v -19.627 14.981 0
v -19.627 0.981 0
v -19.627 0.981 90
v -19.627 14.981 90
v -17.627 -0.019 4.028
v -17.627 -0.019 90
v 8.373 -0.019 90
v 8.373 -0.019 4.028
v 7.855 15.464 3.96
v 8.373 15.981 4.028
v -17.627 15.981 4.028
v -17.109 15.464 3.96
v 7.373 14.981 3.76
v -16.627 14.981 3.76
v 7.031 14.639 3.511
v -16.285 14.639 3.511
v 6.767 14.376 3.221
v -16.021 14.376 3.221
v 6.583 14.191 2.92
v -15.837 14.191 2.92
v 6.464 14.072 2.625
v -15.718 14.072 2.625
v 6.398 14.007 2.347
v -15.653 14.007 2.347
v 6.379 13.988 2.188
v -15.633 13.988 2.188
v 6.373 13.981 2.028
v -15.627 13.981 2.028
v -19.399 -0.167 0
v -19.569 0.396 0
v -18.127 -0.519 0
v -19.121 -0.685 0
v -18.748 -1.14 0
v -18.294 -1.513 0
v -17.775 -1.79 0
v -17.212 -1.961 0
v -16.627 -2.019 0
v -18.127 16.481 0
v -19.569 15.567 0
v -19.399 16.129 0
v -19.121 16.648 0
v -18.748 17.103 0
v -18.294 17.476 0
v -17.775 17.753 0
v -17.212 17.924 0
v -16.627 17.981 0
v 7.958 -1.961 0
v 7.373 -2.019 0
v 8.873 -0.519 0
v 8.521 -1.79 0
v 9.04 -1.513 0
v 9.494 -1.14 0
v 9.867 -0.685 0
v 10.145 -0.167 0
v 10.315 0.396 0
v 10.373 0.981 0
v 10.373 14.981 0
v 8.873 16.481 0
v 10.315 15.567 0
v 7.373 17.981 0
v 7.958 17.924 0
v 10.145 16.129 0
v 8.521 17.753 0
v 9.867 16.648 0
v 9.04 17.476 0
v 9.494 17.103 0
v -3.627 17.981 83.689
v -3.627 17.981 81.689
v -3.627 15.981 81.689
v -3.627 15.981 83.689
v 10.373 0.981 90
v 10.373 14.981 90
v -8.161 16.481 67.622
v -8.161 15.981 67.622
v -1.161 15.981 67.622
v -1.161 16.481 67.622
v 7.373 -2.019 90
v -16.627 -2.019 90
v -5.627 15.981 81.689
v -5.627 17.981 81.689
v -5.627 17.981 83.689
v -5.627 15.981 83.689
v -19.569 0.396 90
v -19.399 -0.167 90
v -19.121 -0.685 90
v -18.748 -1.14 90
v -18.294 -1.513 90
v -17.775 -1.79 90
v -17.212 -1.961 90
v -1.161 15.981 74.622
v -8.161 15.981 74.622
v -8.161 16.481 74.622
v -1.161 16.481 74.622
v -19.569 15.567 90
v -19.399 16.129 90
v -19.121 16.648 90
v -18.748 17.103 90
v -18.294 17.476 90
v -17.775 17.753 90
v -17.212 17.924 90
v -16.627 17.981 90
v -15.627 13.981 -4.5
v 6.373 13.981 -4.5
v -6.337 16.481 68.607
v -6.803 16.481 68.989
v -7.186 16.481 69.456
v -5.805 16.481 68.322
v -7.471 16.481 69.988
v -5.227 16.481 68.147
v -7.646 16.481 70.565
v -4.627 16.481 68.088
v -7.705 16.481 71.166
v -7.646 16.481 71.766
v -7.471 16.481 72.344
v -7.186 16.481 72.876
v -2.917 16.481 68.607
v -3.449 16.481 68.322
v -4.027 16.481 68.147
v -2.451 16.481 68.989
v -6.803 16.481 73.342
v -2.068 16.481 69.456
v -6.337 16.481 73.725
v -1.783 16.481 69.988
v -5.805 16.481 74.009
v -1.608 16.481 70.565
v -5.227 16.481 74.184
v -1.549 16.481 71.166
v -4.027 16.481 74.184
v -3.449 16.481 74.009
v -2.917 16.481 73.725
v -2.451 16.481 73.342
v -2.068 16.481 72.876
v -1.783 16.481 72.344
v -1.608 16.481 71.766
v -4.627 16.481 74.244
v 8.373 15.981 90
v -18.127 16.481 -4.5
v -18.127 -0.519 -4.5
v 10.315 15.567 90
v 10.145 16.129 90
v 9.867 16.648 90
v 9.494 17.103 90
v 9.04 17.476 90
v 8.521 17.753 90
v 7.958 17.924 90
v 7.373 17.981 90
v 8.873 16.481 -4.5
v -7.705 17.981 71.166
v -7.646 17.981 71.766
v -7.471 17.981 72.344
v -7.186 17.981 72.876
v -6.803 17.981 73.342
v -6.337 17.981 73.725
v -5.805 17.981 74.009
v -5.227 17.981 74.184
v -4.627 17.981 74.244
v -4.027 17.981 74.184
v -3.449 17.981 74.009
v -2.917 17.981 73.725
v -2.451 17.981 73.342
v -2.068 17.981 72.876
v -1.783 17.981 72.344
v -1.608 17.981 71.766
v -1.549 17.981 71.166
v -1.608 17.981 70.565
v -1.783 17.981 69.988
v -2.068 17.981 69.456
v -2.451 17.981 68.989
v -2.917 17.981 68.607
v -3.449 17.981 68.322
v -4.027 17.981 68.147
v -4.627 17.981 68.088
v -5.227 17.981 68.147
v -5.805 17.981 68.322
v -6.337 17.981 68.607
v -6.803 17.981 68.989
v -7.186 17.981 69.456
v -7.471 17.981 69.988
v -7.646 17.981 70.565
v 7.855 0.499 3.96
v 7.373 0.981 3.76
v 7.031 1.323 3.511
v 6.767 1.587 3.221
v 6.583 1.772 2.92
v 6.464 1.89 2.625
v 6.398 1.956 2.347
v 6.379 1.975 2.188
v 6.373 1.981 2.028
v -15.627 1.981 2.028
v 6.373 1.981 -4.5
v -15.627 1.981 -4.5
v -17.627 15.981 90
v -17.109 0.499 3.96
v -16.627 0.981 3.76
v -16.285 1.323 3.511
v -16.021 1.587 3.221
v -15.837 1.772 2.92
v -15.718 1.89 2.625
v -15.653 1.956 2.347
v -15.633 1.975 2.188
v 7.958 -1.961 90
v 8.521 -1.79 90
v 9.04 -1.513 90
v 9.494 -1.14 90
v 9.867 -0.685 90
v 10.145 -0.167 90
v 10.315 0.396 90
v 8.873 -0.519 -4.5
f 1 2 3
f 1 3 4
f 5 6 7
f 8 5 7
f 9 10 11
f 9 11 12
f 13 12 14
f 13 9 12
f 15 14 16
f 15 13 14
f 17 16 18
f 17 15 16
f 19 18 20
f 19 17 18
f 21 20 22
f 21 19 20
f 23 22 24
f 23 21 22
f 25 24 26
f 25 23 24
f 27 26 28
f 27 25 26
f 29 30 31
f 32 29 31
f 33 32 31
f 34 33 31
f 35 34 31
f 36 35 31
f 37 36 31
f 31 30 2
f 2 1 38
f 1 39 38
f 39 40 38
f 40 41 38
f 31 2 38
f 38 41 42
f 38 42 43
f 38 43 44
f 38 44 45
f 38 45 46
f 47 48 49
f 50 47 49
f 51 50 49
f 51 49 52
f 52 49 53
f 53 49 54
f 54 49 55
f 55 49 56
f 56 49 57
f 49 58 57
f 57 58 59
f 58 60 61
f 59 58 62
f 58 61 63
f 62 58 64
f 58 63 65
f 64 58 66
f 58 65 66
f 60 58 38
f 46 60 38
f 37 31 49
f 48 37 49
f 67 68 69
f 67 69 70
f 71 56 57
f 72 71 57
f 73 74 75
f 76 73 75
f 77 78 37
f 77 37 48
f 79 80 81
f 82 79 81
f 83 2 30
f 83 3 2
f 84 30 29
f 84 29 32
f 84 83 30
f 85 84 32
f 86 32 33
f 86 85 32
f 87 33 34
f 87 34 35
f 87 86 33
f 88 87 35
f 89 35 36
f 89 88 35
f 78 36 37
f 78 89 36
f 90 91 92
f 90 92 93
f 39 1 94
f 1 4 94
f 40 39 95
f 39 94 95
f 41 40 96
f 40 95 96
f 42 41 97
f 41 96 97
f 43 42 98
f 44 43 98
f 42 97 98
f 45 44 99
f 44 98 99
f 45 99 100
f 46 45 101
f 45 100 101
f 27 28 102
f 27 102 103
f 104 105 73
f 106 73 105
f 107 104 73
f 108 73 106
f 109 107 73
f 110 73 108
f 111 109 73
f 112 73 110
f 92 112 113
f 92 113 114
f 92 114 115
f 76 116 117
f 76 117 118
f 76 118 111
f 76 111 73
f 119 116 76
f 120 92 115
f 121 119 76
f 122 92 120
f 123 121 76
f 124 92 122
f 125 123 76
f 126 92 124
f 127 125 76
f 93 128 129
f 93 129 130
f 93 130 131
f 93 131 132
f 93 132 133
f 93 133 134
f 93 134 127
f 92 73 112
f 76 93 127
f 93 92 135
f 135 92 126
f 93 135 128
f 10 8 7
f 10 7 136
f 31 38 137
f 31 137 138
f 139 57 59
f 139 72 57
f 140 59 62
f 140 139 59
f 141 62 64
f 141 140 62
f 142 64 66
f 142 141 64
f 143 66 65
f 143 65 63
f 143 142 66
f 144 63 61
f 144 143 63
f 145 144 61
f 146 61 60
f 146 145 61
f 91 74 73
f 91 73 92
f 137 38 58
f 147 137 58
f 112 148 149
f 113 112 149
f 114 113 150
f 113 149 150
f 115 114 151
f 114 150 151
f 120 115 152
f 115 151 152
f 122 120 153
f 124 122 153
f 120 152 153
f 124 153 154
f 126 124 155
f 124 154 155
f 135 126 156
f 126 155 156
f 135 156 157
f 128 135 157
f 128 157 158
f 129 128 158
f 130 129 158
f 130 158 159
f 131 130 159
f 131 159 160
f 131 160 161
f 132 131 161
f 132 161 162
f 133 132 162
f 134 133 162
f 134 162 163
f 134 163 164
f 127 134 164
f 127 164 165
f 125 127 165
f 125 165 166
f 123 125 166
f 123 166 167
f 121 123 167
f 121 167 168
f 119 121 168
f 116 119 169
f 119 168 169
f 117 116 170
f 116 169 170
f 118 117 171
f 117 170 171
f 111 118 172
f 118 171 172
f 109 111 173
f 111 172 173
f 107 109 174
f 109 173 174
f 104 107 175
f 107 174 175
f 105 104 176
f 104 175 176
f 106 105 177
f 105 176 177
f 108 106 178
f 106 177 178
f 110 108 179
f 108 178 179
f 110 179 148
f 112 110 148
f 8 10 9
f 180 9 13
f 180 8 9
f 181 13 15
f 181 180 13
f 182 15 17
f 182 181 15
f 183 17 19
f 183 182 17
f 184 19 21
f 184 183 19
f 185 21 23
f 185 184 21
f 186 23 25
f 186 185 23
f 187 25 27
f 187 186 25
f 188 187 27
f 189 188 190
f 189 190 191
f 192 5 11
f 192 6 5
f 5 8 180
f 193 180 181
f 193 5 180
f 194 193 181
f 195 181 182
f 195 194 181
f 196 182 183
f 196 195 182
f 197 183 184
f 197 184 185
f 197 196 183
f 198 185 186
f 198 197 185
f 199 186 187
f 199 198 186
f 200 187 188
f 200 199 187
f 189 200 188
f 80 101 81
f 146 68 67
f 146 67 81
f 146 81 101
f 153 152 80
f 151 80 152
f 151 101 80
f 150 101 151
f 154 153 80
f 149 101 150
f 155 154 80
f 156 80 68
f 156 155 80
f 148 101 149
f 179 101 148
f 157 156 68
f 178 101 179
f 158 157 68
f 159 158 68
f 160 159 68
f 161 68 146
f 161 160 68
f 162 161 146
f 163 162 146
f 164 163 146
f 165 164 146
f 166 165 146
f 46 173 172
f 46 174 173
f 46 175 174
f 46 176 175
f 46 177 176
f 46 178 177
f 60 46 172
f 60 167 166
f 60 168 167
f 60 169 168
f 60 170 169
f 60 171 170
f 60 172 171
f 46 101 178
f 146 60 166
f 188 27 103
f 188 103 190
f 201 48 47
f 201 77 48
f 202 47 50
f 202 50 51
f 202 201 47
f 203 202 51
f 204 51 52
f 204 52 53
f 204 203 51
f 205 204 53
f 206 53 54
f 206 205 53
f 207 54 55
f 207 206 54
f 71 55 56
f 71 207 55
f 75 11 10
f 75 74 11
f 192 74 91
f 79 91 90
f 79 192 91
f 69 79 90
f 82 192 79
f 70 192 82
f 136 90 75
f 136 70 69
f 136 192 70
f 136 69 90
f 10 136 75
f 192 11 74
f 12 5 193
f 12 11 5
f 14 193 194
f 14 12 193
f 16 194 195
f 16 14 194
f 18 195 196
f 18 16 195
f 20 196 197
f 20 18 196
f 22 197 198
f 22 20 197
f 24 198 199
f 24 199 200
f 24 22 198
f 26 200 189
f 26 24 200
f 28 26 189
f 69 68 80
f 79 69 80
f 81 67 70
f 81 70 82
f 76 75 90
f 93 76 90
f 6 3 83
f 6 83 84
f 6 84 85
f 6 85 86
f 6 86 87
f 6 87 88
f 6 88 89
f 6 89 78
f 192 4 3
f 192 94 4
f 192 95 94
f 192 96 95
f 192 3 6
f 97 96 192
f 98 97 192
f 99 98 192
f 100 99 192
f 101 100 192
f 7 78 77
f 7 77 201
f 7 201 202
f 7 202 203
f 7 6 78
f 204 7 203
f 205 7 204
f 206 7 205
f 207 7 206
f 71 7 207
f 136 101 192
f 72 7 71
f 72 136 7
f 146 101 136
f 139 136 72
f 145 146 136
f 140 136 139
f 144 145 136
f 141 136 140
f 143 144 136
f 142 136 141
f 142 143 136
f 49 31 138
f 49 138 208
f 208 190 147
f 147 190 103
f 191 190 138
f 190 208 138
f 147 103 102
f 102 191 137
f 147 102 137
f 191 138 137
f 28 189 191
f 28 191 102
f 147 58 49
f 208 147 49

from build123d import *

# Parameters (mm, degrees)
F0_W      = 30
F0_H      = 20
F1_DEPTH  = 90
F2_R      = 3
F3_W      = 26
F3_H      = 16
F4_DEPTH  = 100
F5_W      = 27
F5_H      = 17
F6_DEPTH  = 4.5
F7_DEPTH  = 5
F8_R      = 3.0778907451
F8_W      = 2
F8_H      = 2
F9_DEPTH  = 2
F10_W     = 7
F10_H     = 7
F11_DEPTH = 0.5
F12_W     = 26
F12_H     = 8.5281978436
F13_DEPTH = 2
F14_W     = 14
F14_H     = 8.5281978436
F15_DEPTH = 2
F16_W     = 24
F16_H     = 8.5281978436
F17_DEPTH = 2
F18_W     = 12
F18_H     = 8.5281978436
F19_DEPTH = 2
F20_R     = 1.99999


# Not quite as in the source:
# - a fillet or chamfer is up to 0.001 mm smaller than in the source, because OpenCascade refuses the exact size


with BuildPart() as f1:
    # F0 (on Top) → F1 (new body)
    with BuildSketch(Plane.XY):
        with Locations((-4.6270154417, 7.9813233296)):
            Rectangle(F0_W, F0_H)
    extrude(amount=F1_DEPTH)

    # F2
    f2_edges = [f1.edges().sort_by_distance(p)[0] for p in [
        (-19.627015, -2.018677, 45),
        (-19.627015, 17.981323, 45),
        (10.372985, -2.018677, 45),
        (10.372985, 17.981323, 45),
    ]]
    fillet(f2_edges, radius=F2_R)

    # F3 (on face) → F4 (cut)
    with BuildSketch(Plane.XY.offset(90)):
        with Locations((-4.6270154417, 7.9813233296)):
            Rectangle(F3_W, F3_H)
    extrude(amount=-F4_DEPTH, mode=Mode.SUBTRACT)

    # F5 (on face) → F6 (join)
    with BuildSketch(Plane(origin=(0, 0, 0), x_dir=(1, 0, 0), z_dir=(0, 0, -1))):
        with Locations((-4.6270154417, -7.9813233296)):
            Rectangle(F5_W, F5_H)
    extrude(amount=F6_DEPTH)

    # F7 (cut): a face of the model
    f7_faces = [f1.faces().sort_by_distance(p)[0] for p in [
        (-4.6270154417, 7.9813233296, 0),
    ]]
    extrude(f7_faces, amount=-F7_DEPTH, mode=Mode.SUBTRACT)

    # F8 (on face) → F9 (cut)
    with BuildSketch(Plane(origin=(0, 17.9813233296, 0), x_dir=(-1, 0, 0), z_dir=(0, 1, 0))):
        with Locations((4.6270154417, 71.1657330394)):
            Circle(F8_R)
        with Locations((4.6270154417, 82.6890671849)):
            Rectangle(F8_W, F8_H)
    extrude(amount=-F9_DEPTH, mode=Mode.SUBTRACT)

    # F10 (on face) → F11 (cut)
    with BuildSketch(Plane.XZ.offset(-15.9813233296)):
        with Locations((-4.6607098193, 71.1224186855)):
            Rectangle(F10_W, F10_H)
    extrude(amount=-F11_DEPTH, mode=Mode.SUBTRACT)

    # F12 (on face) → F13 (join)
    with BuildSketch(Plane.XZ.offset(-15.9813233296)):
        with Locations((-4.6270154417, -0.2359010782)):
            Rectangle(F12_W, F12_H)
    extrude(amount=F13_DEPTH)

    # F14 (on face) → F15 (join)
    with BuildSketch(Plane(origin=(8.3729845583, 0, 0), x_dir=(0, -1, 0), z_dir=(-1, 0, 0))):
        with Locations((-6.9813233296, -0.2359010782)):
            Rectangle(F14_W, F14_H)
    extrude(amount=F15_DEPTH)

    # F16 (on face) → F17 (join)
    with BuildSketch(Plane(origin=(0, -0.0186766704, 0), x_dir=(-1, 0, 0), z_dir=(0, 1, 0))):
        with Locations((5.6270154417, -0.2359010782)):
            Rectangle(F16_W, F16_H)
    extrude(amount=F17_DEPTH)

    # F18 (on face) → F19 (join)
    with BuildSketch(Plane.YZ.offset(-17.6270154417)):
        with Locations((7.9813233296, -0.2359010782)):
            Rectangle(F18_W, F18_H)
    extrude(amount=F19_DEPTH)

    # F20 (radius 2 in the source; OpenCascade refuses exactly that, so slightly less here)
    f20_edges = [f1.edges().sort_by_distance(p)[0] for p in [
        (-15.627015, 7.981323, 4.028198),
        (-4.627015, 1.981323, 4.028198),
        (6.372985, 7.981323, 4.028198),
        (-4.627015, 13.981323, 4.028198),
    ]]
    fillet(f20_edges, radius=F20_R)


solid = f1.part
